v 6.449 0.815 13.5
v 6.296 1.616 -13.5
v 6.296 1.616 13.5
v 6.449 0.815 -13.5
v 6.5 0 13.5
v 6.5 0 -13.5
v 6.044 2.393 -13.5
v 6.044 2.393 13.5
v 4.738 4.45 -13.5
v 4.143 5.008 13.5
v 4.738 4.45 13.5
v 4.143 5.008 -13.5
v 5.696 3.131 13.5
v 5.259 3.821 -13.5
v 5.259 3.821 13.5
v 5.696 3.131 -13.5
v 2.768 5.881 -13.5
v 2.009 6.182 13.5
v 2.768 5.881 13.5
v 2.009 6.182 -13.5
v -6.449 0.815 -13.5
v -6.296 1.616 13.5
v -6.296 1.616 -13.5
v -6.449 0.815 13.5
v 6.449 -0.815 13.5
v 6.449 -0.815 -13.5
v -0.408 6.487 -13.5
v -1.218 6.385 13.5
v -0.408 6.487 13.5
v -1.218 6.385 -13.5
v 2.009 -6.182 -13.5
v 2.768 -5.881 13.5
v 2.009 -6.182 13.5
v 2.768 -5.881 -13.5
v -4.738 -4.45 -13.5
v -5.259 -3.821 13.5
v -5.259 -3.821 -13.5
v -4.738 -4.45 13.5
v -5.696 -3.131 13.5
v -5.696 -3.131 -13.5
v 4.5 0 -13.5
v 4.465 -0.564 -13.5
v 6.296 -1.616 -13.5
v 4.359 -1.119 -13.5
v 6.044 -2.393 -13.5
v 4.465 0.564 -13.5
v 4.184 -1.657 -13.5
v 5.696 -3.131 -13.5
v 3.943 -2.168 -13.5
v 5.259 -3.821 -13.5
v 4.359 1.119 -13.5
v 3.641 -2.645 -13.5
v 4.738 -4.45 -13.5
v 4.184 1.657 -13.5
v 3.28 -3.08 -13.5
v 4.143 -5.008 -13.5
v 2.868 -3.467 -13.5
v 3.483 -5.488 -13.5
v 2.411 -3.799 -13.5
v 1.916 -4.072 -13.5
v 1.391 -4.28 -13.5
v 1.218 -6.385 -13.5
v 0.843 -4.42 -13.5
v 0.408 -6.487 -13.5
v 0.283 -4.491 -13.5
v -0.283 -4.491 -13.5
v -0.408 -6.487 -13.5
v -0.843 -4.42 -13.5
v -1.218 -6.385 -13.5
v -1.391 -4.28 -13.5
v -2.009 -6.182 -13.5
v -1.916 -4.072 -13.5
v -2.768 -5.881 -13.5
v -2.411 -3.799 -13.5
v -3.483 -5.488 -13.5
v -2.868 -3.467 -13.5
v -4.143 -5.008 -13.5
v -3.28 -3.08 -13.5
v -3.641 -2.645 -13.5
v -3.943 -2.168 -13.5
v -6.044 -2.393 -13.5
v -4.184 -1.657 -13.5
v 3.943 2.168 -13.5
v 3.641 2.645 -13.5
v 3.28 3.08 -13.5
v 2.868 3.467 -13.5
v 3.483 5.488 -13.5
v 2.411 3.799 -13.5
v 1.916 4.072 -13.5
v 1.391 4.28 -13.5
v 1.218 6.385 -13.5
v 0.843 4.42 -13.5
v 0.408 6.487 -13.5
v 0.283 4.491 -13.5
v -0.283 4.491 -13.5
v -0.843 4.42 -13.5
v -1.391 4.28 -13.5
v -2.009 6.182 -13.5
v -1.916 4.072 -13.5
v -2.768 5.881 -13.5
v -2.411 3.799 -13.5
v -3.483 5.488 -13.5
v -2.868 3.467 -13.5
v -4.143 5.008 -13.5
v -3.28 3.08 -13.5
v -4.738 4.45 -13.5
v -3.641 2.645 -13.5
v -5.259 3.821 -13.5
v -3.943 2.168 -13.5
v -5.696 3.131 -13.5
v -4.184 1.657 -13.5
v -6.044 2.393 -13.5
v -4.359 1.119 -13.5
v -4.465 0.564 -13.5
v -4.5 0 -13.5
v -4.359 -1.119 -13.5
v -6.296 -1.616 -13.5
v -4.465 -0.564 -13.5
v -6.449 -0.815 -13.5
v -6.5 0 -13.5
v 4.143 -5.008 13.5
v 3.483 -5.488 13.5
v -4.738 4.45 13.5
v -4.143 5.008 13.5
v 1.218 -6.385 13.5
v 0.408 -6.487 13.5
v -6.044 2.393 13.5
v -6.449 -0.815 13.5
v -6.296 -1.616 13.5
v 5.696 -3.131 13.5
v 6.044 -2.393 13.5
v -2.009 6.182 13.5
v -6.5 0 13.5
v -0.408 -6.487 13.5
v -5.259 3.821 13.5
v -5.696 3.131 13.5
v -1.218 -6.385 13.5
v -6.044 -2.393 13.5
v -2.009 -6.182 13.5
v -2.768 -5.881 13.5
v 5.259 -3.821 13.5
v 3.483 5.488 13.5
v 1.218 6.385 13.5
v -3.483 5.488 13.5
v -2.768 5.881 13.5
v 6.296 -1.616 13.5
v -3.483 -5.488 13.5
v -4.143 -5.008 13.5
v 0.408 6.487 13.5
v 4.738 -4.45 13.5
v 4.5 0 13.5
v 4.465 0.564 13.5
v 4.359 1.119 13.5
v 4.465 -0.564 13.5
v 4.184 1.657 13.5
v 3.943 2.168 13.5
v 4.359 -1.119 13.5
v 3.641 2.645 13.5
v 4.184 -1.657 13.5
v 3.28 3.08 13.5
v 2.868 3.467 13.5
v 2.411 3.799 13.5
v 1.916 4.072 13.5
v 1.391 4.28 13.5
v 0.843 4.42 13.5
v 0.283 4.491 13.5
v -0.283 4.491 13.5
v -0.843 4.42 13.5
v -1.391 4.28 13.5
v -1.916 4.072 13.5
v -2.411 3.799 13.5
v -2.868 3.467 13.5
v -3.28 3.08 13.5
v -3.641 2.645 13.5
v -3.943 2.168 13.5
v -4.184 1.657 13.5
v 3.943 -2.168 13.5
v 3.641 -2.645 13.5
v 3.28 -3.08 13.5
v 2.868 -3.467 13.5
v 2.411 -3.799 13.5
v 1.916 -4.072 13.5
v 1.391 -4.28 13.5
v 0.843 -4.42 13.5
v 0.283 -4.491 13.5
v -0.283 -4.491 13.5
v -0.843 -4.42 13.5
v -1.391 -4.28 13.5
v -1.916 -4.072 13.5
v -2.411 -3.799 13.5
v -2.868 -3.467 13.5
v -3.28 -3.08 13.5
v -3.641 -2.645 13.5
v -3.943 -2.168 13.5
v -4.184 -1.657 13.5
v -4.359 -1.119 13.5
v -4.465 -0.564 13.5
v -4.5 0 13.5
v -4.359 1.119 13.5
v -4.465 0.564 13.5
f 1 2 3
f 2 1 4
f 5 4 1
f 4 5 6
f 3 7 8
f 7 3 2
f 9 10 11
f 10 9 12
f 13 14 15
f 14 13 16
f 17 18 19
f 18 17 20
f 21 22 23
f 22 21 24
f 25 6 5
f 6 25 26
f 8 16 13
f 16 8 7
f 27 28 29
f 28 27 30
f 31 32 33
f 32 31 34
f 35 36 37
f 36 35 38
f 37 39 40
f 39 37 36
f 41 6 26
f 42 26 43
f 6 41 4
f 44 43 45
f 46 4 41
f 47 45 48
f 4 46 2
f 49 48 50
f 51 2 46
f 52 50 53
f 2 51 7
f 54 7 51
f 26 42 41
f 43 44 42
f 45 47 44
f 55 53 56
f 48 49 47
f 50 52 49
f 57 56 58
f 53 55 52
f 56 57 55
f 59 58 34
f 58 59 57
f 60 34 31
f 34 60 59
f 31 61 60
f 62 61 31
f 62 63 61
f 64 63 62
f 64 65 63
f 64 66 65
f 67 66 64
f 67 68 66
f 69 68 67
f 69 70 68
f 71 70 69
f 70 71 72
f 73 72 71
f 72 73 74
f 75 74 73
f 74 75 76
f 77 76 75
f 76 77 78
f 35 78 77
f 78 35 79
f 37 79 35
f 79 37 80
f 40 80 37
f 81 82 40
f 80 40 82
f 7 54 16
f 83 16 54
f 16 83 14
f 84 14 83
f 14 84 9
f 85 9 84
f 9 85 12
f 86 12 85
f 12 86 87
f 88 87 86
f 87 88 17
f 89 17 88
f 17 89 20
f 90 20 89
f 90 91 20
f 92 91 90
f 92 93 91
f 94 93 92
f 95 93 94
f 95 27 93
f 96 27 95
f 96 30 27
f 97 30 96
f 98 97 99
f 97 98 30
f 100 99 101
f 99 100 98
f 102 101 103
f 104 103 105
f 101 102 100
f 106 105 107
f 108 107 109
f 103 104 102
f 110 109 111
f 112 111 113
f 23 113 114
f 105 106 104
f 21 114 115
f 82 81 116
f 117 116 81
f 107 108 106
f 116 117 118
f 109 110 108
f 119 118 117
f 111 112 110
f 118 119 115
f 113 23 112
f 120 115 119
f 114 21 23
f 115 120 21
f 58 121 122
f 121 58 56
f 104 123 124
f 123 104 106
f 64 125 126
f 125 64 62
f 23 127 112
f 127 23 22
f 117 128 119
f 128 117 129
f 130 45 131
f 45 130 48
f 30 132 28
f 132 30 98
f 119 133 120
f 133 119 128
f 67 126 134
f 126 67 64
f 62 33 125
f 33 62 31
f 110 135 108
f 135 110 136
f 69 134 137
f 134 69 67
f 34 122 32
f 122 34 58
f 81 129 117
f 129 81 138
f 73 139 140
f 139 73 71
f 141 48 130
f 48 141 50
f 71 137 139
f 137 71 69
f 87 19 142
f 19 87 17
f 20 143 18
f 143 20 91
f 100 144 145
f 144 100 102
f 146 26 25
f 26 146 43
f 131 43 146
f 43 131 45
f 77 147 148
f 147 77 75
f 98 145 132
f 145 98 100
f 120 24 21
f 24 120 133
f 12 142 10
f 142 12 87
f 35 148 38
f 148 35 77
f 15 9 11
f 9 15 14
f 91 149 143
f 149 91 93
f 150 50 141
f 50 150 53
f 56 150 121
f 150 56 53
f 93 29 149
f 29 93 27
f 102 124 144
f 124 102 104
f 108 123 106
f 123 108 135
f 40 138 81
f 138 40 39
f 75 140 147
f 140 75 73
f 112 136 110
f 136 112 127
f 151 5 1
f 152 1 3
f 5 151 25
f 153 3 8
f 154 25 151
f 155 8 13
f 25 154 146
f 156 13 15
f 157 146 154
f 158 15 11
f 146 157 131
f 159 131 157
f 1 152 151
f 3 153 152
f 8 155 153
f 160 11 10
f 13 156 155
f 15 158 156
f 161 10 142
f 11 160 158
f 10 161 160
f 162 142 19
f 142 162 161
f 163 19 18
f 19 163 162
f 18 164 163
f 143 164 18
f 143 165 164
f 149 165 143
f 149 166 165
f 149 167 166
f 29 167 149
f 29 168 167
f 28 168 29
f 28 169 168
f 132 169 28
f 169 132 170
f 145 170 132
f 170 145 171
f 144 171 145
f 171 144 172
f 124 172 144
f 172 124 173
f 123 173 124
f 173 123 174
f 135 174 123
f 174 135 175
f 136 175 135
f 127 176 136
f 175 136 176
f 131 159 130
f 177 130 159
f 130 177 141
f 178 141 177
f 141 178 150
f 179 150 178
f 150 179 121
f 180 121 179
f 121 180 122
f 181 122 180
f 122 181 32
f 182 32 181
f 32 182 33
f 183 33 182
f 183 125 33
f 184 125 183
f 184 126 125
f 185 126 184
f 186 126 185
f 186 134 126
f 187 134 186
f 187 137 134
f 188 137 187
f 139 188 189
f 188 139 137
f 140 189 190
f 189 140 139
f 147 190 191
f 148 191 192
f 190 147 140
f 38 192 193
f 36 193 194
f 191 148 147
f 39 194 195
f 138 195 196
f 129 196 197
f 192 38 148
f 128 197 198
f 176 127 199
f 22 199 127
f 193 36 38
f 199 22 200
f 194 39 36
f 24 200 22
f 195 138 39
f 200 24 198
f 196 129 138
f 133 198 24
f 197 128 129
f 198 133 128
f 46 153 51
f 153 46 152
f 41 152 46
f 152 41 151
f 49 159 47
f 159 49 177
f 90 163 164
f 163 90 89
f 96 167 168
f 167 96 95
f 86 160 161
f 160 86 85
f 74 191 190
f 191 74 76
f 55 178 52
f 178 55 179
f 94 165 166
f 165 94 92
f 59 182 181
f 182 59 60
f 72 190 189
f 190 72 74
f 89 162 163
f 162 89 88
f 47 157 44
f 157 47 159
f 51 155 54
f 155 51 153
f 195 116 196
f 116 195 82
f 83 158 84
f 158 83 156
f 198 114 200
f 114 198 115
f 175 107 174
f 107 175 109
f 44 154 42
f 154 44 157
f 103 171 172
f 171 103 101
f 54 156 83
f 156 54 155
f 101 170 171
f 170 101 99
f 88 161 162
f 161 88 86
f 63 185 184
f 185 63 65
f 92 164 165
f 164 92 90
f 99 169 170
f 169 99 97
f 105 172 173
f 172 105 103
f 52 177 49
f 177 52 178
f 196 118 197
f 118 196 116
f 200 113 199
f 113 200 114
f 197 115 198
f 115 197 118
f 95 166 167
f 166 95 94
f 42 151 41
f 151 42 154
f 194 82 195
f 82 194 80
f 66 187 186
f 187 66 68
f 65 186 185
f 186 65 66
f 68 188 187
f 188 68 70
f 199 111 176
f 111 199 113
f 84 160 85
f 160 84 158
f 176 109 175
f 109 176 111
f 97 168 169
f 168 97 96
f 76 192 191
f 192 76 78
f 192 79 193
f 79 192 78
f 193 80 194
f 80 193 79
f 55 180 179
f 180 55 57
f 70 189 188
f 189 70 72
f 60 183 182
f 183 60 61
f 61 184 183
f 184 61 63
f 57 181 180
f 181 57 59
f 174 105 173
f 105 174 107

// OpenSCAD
$fn = 50;


difference() {
	union() {
		translate(v = [0, 0, -13.5000000000]) {
			cylinder(h = 27, r = 6.5000000000);
		}
	}
	union() {
		translate(v = [0, 0, -100.0000000000]) {
			cylinder(h = 200, r = 4.5000000000);
		}
	}
}
